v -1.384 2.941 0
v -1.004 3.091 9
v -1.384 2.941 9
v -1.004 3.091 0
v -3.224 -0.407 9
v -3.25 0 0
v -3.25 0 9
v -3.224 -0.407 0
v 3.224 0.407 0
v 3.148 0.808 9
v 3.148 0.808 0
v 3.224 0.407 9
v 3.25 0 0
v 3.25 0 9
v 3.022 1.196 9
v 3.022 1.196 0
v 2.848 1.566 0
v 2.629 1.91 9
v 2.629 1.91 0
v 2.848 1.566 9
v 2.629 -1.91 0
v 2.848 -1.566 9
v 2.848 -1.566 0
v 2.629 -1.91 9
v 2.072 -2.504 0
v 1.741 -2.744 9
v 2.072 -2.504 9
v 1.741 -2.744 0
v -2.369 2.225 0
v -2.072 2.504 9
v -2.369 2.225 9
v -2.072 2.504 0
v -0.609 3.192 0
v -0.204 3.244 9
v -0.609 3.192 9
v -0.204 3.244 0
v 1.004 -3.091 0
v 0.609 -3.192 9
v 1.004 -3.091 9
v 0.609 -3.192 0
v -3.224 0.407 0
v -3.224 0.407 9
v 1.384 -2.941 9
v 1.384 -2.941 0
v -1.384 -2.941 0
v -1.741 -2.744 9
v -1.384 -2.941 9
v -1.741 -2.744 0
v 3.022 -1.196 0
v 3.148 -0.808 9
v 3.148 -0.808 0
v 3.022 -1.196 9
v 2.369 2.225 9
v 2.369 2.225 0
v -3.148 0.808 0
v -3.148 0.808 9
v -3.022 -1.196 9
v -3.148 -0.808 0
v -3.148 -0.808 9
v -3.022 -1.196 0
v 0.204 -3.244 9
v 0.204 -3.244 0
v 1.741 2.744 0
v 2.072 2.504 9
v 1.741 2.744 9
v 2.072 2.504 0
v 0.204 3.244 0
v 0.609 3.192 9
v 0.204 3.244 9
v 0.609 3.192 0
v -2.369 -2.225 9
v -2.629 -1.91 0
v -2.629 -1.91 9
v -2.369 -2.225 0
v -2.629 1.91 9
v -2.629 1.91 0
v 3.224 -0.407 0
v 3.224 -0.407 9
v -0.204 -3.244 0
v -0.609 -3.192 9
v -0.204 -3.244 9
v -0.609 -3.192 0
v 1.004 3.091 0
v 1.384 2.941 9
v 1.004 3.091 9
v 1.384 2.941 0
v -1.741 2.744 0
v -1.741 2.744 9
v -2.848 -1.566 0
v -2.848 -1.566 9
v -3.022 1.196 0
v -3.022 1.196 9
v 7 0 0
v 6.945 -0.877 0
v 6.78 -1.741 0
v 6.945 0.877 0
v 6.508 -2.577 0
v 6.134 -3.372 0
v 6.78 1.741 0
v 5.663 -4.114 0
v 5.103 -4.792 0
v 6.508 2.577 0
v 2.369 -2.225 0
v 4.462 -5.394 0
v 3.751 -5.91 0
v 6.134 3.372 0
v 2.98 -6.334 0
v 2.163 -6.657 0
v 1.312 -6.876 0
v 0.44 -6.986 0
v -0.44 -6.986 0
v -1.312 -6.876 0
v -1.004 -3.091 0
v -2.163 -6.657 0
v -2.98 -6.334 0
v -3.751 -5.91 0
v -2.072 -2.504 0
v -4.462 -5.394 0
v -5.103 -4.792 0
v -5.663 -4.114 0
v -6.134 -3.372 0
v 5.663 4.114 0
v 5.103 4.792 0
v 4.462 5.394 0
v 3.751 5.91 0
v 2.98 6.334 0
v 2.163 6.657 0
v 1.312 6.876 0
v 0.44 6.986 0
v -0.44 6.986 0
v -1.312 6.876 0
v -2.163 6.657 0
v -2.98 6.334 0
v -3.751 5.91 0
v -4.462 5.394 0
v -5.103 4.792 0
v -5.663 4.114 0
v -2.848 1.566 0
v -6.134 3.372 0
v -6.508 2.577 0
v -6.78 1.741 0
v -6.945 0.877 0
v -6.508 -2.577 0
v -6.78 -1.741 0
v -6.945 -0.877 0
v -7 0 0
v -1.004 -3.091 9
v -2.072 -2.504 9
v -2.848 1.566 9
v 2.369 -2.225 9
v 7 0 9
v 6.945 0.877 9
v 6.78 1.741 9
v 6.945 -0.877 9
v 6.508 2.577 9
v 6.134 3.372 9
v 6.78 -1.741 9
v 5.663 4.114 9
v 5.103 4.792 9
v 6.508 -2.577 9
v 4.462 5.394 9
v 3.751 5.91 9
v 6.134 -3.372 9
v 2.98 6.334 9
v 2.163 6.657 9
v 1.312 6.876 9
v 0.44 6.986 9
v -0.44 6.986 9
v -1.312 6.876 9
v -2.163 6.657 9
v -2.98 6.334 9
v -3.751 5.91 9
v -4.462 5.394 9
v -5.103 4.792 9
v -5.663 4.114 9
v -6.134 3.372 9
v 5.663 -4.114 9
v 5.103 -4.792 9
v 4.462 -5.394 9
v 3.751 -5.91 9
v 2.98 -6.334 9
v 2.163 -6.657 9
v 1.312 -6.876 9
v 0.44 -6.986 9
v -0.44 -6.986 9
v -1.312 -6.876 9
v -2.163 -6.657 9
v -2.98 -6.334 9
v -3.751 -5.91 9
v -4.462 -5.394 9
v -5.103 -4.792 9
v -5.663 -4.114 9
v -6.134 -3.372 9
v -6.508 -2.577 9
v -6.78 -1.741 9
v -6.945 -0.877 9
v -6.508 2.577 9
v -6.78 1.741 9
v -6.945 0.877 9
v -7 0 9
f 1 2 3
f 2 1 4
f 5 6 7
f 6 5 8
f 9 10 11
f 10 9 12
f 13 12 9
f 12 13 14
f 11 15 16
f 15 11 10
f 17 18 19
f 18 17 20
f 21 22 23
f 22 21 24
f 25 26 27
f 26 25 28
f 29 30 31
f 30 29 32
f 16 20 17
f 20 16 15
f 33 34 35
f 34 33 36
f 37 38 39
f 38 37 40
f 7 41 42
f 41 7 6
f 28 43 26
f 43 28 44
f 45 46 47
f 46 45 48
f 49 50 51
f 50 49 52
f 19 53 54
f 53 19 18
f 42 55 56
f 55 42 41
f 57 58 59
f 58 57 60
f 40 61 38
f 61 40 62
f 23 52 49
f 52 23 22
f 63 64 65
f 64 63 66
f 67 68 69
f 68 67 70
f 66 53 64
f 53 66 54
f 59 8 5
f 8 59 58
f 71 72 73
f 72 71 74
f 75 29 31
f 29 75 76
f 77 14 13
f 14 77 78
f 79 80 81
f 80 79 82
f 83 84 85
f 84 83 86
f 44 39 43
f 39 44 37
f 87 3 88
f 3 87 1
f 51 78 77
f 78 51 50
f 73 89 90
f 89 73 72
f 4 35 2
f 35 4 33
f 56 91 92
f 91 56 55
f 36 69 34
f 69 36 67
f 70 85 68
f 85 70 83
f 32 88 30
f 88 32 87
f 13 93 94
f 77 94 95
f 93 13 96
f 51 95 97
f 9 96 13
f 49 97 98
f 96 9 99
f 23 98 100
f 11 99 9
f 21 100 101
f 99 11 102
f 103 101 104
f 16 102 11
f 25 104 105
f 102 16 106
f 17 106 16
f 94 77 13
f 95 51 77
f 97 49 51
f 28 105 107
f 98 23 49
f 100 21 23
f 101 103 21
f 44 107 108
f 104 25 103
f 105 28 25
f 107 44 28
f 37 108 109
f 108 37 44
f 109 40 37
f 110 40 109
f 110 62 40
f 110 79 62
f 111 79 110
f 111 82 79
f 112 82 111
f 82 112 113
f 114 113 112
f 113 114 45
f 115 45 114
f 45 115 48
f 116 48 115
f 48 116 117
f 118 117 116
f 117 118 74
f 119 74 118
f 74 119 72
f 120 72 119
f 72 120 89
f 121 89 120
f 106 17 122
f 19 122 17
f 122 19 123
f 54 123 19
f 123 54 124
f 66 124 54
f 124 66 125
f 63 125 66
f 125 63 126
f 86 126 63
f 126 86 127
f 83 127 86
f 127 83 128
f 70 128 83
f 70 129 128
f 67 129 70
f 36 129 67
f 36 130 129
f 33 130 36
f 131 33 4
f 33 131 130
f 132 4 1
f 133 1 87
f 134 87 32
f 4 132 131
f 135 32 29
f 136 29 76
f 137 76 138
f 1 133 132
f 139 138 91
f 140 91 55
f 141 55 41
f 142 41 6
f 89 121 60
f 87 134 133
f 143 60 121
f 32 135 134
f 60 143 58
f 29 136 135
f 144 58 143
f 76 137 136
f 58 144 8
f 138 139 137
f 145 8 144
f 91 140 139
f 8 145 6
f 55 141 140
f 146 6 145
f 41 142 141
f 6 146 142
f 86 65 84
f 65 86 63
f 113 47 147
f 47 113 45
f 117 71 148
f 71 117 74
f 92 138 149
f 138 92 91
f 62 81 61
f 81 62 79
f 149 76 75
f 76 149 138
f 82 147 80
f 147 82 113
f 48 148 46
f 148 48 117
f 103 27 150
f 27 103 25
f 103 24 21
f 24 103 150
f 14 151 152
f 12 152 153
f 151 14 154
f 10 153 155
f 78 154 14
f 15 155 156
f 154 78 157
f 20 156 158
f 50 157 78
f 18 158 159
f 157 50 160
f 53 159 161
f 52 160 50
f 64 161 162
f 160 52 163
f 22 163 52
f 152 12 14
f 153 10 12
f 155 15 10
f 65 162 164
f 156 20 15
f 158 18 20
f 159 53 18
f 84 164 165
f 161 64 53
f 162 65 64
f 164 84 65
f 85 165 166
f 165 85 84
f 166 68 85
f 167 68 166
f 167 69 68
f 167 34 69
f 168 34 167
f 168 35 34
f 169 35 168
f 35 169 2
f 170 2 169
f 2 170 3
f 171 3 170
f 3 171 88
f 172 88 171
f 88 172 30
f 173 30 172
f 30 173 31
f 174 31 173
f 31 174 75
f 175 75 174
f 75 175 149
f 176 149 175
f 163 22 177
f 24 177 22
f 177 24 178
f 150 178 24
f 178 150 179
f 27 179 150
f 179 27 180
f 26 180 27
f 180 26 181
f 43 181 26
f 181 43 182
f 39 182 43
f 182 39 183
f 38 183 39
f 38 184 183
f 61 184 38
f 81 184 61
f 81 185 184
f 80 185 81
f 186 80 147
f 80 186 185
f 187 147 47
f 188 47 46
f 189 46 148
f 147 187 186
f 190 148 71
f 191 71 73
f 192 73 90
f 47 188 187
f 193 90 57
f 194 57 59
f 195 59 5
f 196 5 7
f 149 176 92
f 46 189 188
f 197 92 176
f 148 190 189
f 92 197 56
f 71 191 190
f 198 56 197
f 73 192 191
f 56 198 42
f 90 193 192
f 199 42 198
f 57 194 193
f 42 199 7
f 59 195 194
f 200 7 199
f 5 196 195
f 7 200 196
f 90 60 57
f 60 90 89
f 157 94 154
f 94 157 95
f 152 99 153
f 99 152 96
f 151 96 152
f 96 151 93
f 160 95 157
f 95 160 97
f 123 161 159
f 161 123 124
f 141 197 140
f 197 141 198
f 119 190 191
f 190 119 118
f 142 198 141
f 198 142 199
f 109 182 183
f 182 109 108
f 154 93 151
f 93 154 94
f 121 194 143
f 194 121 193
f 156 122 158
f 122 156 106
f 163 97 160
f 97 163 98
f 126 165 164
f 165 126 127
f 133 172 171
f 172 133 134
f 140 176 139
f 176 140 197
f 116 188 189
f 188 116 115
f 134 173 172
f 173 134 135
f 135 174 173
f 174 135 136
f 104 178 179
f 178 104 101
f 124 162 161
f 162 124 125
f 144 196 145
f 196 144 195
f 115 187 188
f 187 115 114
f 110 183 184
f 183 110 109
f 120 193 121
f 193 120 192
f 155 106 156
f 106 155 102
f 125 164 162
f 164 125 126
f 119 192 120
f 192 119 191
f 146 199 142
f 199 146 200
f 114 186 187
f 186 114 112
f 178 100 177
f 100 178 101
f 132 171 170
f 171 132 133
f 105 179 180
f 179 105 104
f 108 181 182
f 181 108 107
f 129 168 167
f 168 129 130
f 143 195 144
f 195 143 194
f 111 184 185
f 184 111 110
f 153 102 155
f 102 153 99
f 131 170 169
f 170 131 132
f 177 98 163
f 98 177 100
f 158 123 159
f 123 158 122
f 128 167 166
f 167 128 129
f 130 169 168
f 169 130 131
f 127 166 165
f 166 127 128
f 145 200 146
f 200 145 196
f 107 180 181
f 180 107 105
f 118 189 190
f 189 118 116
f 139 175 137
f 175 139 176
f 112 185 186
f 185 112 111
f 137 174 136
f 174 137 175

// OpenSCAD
$fn = 50;


difference() {
	union() {
		cylinder(h = 9, r = 7.0000000000);
	}
	union() {
		cylinder(h = 9, r = 3.2500000000);
		cylinder(h = 9, r = 1.8000000000);
		cylinder(h = 9, r = 1.8000000000);
		cylinder(h = 9, r = 1.8000000000);
	}
}
